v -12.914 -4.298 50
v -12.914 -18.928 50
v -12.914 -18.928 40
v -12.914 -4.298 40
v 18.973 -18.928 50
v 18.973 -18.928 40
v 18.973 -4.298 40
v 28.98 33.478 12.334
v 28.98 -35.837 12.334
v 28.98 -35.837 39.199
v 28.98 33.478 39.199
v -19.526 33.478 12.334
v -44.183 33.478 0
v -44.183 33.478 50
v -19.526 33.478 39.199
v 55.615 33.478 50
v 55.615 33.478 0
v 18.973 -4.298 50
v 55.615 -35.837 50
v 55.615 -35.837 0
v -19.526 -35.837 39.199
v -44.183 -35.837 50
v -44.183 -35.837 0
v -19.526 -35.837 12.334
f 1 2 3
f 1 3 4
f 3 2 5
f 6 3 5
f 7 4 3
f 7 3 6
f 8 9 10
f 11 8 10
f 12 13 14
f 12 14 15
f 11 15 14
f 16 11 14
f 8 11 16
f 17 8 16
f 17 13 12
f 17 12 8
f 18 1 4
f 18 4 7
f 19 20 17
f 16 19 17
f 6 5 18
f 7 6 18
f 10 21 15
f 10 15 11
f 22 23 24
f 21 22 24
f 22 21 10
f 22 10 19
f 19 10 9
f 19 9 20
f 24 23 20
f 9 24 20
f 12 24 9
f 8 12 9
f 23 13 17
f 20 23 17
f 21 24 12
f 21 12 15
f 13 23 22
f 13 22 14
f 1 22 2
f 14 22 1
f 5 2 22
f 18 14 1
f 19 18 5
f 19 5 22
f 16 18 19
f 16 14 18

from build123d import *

# Parameters (mm, degrees)
F0_W     = 99.7983887792
F0_H     = 69.3145208061
F1_DEPTH = 50
F2_W     = 48.5056806356
F2_H     = 26.864730753
F3_DEPTH = 100
F7_W     = 31.8869445473
F7_H     = 14.6304946393
F8_DEPTH = 10


with BuildPart() as f1:
    # F0 (on Top) → F1 (new body)
    with BuildSketch(Plane.XY):
        with Locations((5.7157240808, -1.1794362217)):
            Rectangle(F0_W, F0_H)
    extrude(amount=F1_DEPTH)

    # F2 (on face) → F3 (cut)
    with BuildSketch(Plane.XZ.offset(35.8366966248)):
        with Locations((4.7271503136, 25.766398292)):
            Rectangle(F2_W, F2_H)
    extrude(amount=-F3_DEPTH, mode=Mode.SUBTRACT)

    # F7 (on face) → F8 (cut)
    with BuildSketch(Plane.XY.offset(50)):
        with Locations((3.0299229547, -11.6131016985)):
            Rectangle(F7_W, F7_H)
    extrude(amount=-F8_DEPTH, mode=Mode.SUBTRACT)


solid = f1.part
